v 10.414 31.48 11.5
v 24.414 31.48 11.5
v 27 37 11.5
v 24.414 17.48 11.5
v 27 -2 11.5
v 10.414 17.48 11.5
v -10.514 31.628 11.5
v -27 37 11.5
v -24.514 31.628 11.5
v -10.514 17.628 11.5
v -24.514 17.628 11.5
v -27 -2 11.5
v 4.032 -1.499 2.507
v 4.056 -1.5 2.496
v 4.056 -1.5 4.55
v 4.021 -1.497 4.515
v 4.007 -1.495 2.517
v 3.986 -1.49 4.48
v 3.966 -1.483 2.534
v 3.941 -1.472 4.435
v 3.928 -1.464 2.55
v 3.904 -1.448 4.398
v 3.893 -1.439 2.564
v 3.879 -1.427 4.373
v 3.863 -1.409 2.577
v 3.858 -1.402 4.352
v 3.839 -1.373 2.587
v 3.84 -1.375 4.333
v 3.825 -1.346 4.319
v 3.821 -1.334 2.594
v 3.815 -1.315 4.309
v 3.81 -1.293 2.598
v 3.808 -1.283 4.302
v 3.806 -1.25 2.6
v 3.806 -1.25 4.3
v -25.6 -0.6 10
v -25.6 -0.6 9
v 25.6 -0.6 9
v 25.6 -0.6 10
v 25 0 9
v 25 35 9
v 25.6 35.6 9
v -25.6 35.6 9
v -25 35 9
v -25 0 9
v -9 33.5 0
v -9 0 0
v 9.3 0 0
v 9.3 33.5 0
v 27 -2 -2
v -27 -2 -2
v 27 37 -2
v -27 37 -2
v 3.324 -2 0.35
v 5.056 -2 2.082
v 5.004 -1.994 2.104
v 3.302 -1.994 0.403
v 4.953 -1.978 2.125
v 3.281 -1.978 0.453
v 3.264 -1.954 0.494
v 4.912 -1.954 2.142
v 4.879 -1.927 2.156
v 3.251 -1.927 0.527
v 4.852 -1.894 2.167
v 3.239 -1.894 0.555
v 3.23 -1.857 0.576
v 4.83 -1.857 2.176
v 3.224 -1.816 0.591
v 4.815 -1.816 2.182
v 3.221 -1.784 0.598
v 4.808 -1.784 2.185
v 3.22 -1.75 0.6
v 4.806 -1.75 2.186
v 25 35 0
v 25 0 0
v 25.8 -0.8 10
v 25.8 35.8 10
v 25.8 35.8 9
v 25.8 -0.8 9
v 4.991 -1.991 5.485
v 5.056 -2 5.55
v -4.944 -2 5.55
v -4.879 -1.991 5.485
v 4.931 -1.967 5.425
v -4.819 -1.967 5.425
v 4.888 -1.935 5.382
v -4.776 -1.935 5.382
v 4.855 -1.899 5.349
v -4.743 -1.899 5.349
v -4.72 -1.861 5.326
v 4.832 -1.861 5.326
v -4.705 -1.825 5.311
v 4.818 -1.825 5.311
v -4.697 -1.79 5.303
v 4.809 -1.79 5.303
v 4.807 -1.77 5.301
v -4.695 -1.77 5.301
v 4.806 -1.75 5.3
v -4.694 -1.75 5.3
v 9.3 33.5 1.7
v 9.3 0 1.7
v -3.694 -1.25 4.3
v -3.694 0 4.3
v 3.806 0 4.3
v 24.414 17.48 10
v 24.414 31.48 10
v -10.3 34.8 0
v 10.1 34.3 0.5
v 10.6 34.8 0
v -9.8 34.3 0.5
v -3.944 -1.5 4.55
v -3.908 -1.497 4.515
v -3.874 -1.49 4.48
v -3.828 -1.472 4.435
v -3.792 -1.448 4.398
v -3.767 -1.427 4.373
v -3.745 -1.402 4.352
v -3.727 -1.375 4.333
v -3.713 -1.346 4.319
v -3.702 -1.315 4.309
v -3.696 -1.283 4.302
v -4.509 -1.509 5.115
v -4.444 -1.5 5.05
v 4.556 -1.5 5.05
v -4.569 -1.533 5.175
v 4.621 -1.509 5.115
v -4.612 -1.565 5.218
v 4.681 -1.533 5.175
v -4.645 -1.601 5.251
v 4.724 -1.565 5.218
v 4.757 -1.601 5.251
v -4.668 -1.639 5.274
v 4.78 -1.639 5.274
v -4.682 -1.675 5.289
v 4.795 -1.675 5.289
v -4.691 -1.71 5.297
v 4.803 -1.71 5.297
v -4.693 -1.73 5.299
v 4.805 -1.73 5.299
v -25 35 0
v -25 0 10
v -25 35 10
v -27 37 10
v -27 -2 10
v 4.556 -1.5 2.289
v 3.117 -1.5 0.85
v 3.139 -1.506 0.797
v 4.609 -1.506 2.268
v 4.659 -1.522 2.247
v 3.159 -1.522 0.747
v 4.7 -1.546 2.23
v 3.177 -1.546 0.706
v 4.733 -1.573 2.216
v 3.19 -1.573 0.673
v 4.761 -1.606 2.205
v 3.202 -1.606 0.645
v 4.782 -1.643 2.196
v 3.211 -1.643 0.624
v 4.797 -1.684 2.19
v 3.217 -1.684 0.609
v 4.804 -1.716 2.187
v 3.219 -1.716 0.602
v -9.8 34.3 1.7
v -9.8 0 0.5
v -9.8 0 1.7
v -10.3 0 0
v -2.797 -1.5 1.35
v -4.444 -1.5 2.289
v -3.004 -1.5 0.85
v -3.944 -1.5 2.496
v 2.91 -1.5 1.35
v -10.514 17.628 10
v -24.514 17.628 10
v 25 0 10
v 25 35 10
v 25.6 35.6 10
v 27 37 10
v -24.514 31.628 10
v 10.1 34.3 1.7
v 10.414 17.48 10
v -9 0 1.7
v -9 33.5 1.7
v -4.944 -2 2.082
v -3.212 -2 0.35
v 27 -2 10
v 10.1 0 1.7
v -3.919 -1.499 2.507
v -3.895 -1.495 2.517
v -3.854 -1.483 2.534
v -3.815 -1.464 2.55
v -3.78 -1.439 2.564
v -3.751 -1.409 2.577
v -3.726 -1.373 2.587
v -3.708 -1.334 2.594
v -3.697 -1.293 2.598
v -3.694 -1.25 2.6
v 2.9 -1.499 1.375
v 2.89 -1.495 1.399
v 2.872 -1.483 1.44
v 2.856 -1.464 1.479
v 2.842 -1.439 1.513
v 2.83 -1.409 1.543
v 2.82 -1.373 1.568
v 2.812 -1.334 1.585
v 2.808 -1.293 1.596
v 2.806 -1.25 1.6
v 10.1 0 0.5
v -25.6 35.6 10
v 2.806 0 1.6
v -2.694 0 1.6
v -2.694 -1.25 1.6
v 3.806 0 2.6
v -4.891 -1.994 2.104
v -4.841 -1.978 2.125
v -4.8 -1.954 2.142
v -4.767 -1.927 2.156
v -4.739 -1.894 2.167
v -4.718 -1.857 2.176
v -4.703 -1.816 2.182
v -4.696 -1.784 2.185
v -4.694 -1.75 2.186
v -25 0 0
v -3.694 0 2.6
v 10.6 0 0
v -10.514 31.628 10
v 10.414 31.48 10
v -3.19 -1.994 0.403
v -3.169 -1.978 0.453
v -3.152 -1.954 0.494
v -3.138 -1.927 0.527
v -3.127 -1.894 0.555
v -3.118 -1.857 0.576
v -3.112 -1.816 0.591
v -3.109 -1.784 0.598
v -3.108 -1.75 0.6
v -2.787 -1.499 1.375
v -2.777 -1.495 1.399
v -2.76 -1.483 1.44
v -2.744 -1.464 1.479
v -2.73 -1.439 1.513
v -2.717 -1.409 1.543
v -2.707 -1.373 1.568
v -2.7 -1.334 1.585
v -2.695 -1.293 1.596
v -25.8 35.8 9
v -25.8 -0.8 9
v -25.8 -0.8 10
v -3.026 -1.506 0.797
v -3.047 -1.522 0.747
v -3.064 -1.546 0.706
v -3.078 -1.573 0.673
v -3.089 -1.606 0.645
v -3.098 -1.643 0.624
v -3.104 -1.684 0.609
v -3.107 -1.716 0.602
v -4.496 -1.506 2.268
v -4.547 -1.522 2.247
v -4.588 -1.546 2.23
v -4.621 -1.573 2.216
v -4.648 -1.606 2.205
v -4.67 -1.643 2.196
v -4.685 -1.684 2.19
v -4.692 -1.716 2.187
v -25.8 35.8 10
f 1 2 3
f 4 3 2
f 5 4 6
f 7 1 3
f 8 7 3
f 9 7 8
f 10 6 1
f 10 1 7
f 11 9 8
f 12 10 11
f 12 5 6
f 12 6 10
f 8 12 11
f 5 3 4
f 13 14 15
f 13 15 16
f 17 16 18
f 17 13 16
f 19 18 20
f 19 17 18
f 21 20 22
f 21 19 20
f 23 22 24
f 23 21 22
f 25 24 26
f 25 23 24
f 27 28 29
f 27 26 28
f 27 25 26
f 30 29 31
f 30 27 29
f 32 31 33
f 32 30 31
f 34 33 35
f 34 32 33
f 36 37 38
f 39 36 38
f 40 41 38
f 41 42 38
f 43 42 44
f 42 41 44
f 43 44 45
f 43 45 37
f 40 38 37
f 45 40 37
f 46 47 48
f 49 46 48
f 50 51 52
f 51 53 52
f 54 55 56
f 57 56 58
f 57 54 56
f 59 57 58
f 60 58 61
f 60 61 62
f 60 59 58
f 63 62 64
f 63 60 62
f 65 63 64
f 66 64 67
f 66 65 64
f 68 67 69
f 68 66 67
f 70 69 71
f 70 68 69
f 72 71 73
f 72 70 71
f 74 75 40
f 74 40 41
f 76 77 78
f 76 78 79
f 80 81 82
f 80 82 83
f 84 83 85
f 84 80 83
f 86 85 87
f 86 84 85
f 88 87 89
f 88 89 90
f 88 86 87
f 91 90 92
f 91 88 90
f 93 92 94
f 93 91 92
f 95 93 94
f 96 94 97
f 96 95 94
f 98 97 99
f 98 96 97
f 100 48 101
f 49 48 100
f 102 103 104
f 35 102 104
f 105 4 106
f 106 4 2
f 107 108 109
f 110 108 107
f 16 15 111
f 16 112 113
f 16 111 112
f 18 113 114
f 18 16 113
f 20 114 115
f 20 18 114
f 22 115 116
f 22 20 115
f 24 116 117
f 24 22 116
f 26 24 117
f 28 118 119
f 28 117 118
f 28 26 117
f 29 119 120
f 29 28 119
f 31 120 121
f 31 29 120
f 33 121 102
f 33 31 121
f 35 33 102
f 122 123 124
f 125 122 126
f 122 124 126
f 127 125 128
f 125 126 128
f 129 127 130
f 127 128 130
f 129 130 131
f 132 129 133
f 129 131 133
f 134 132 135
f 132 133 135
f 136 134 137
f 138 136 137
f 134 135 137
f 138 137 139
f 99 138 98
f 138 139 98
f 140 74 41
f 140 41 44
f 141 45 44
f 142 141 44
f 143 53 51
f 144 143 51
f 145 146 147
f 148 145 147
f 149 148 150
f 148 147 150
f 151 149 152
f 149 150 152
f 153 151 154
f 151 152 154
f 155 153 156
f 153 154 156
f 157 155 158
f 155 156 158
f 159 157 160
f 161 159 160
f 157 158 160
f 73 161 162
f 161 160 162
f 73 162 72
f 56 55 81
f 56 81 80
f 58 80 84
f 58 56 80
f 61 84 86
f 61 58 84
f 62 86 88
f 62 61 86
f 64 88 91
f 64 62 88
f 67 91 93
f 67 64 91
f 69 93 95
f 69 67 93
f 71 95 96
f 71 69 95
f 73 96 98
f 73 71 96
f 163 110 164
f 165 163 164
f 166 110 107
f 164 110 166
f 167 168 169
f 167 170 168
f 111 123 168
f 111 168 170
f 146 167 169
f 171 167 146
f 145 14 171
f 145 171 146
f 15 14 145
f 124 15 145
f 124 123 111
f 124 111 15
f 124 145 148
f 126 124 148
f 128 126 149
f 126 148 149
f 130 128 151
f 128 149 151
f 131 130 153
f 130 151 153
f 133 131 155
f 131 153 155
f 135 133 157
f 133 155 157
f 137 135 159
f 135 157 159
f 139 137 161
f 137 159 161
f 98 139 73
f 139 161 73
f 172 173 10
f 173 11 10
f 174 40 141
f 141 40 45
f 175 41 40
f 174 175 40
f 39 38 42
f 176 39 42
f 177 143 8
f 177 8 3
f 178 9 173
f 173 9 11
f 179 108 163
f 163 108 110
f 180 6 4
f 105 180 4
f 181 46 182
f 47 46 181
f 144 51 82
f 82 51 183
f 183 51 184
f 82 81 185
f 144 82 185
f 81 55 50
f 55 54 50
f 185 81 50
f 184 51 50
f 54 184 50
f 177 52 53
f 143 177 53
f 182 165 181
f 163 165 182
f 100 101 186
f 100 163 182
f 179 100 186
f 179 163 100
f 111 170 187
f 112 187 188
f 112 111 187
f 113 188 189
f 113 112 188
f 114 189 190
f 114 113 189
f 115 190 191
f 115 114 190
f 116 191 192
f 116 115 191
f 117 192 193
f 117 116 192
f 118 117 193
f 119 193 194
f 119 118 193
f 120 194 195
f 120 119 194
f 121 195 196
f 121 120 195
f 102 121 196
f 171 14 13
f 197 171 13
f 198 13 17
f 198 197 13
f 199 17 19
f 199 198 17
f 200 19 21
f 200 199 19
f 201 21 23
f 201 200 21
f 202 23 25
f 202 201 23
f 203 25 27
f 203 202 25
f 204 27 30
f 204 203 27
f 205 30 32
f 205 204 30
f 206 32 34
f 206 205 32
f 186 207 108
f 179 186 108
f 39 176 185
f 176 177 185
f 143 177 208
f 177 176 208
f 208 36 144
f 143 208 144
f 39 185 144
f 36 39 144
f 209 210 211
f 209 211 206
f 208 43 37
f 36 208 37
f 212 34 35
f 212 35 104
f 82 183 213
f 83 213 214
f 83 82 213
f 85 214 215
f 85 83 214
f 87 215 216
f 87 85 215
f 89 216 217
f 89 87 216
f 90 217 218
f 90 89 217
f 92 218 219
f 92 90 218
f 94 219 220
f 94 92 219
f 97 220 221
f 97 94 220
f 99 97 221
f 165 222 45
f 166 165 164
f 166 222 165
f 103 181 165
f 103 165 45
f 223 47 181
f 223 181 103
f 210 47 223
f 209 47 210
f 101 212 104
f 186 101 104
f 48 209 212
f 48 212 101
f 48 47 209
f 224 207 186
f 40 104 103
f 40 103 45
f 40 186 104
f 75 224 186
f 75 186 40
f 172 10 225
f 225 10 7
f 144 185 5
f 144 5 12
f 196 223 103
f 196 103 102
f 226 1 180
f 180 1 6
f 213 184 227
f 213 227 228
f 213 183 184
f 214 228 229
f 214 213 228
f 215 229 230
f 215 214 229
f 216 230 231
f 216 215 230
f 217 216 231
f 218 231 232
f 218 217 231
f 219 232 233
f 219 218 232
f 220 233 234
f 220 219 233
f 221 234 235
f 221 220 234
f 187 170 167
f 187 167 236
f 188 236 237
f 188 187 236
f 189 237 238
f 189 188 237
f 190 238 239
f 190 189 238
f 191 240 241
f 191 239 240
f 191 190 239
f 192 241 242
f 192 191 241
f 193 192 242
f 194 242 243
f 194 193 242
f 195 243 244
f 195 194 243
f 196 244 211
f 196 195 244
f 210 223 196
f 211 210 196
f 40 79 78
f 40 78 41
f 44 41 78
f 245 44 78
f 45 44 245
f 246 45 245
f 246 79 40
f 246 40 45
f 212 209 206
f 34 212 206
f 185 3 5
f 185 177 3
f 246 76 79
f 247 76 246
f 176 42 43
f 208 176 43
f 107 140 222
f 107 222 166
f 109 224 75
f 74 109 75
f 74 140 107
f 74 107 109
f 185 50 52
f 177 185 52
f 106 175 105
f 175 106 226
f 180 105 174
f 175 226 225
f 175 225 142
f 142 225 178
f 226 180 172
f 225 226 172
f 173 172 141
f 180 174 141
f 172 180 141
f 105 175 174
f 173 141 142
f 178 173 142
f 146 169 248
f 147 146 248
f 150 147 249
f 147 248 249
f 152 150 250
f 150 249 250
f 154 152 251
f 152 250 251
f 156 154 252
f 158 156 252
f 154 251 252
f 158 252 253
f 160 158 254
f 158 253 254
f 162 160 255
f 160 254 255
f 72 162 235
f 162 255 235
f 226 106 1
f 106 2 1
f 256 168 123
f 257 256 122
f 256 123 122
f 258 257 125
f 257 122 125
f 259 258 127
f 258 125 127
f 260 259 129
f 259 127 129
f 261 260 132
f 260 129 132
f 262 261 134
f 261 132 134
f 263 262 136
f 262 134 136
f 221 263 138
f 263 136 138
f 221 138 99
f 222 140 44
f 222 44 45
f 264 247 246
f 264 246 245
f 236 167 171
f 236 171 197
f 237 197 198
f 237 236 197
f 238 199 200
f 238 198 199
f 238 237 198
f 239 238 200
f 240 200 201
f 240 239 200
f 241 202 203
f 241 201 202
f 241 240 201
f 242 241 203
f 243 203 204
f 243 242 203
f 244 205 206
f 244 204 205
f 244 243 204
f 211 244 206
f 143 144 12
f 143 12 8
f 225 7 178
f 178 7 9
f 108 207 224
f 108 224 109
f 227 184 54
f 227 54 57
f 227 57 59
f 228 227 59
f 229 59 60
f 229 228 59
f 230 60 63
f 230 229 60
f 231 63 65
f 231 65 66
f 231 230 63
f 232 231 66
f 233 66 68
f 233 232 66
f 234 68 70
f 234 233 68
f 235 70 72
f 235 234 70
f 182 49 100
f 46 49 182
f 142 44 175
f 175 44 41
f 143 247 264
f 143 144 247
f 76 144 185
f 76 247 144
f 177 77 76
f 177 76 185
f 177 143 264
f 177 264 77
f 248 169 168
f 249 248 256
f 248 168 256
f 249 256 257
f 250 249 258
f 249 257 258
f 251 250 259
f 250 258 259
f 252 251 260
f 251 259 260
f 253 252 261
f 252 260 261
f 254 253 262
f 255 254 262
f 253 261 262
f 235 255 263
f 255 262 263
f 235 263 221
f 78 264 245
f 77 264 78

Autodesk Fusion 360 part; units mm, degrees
sketch "Sketch1" plane through (0, 0, 0) normal (0, 0, 1) x (1, 0, 0)
  line L0 (-25, 0) -> (25, 0)
  line L1 (25, 0) -> (25, 35)
  line L2 (25, 35) -> (-25, 35)
  line L3 (-25, 35) -> (-25, 0)
  line L4 (27, -2) -> (27, 37)
  line L5 (27, 37) -> (-27, 37)
  line L6 (-27, 37) -> (-27, -2)
  line L7 (-27, -2) -> (27, -2)
  line L8 (0, 0) -> (0, -1.5)
  line L9 (-9, 0) -> (9.3, 0)
  line L10 (9.3, 0) -> (9.3, 33.5)
  line L11 (9.3, 33.5) -> (-9, 33.5)
  line L12 (-9, 33.5) -> (-9, 0)
  line L13 (-3.6938, -1.5) -> (3.8062, -1.5)
  line L14 (3.8062, -1.5) -> (3.8062, 0)
  line L15 (3.8062, 0) -> (-3.6938, 0)
  line L16 (-3.6938, 0) -> (-3.6938, -1.5)
  line L17 (10.1, 0) -> (10.1, 34.3)
  line L18 (10.1, 34.3) -> (-9.8, 34.3)
  line L19 (-9.8, 34.3) -> (-9.8, 0)
  dimension "d1" = 50
  dimension "d2" = 35
  dimension "d5" = 2
  dimension "d11" = 1.5
  dimension "d12" = 18.3
  dimension "d13" = 33.5
  dimension "d14" = 7.5
  dimension "d15" = 0.8
extrude "Extrude3" add sketch "Sketch1" along normal blind 1.7 contours L0 L10 L11 L12 L17 L18 L19 makes body 1
extrude "Extrude1" add sketch "Sketch1" against normal blind 2 separate body contours L0 L1 L2 L3 L17 L18 L19 | L0 L10 L11 L12 L17 L18 L19 | L0 L9 L10 L11 L12 L15 | L0 L8 L9 L13 L15 L16 | L0 L8 L9 L13 L14 L15 | L4 L5 L6 L7 makes body 2
extrude "Extrude2" add sketch "Sketch1" along normal blind 10 contours L0 L8 L9 L13 L15 L16 | L0 L8 L9 L13 L14 L15 | L4 L5 L6 L7 bodies 2
ref_plane "WorkPlane1" through (1.9031, -0.75, 1.7) normal (0, 0, 1) x (1, 0, 0)
sketch "Sketch2" plane through (1.9031, -0.75, 1.7) normal (0, 0, 1) x (1, 0, 0)
  line L0 (1.9031, -0.75) -> (1.9031, 0.75)
  line L1 (-5.5969, -0.75) -> (1.9031, -0.75)
  line L2 (-5.5969, 0.75) -> (-5.5969, -0.75)
  line L3 (1.9031, 0.75) -> (-5.5969, 0.75)
  line L4 (-5.5969, 0.75) -> (1.9031, 0.75)
  line L5 (1.9031, 0.75) -> (1.9031, -1.7033)
  line L6 (1.9031, -1.7033) -> (-5.5969, -1.7033)
  line L7 (-5.5969, -1.7033) -> (-5.5969, 0.75)
extrude "Extrude4" cut sketch "Sketch2" along normal blind 2.6 and the other way blind 0.1 bodies 2
chamfer "Chamfer1" distance 1 angle 45 2 edges at (-3.6938, -1, 1.6) (3.8062, -1, 1.6) on bodies 2
sketch "Sketch3" plane through (0, -2, 0) normal (0, -1, 0) x (1, 0, 0)
  line L0 (2.8062, 1.6) -> (-2.6938, 1.6)
  line L1 (-2.6938, 1.6) -> (-3.6938, 2.6)
  line L2 (-3.6938, 2.6) -> (-3.6938, 4.3)
  line L3 (-3.6938, 4.3) -> (3.8062, 4.3)
  line L4 (3.8062, 4.3) -> (3.8062, 2.6)
  line L5 (3.8062, 2.6) -> (2.8062, 1.6)
  line L6 (-27, 10) -> (-27, -2)
  line L7 (-27, -2) -> (27, -2)
  line L8 (27, -2) -> (27, 10)
  line L9 (27, 10) -> (-27, 10)
  line L10 (-3.6938, 4.3) -> (3.8062, 4.3)
  line L11 (3.8062, 4.3) -> (3.8062, 2.6)
  line L12 (2.8062, 1.6) -> (3.8062, 2.6)
  line L13 (2.8062, 1.6) -> (-2.6938, 1.6)
  line L14 (-3.6938, 2.6) -> (-2.6938, 1.6)
  line L15 (-3.6938, 2.6) -> (-3.6938, 4.3)
  line L16 (4.8062, 2.1858) -> (3.2204, 0.6)
  line L17 (3.2204, 0.6) -> (-3.108, 0.6)
  line L18 (-3.108, 0.6) -> (-4.6938, 2.1858)
  line L19 (-4.6938, 2.1858) -> (-4.6938, 5.3)
  line L20 (-4.6938, 5.3) -> (4.8062, 5.3)
  line L21 (4.8062, 5.3) -> (4.8062, 2.1858)
  dimension "d24" = -1
extrude "Extrude6" cut sketch "Sketch3" against normal blind 0.5 contours L16 L17 L18 L19 L20 L21 bodies 2
fillet "Fillet1" radius 0.25 18 edges at (0.0562, -1.5, 5.3) (0.0562, -2, 5.3) (-4.6938, -1.5, 3.7429) (-4.6938, -2, 3.7429) (-3.9009, -2, 1.3929) (-3.9009, -1.5, 1.3929) (0.0562, -1.5, 0.6) (0.0562, -2, 0.6) (4.8062, -1.5, 3.7429) (4.8062, -2, 3.7429) (4.0133, -1.5, 1.3929) (4.0133, -2, 1.3929) (0.0562, -1.5, 4.3) (-3.6938, -1.5, 3.45) (-3.1938, -1.5, 2.1) (0.0562, -1.5, 1.6) (3.3062, -1.5, 2.1) (3.8062, -1.5, 3.45) on bodies 2
combine "Combine1" operation add target body 1 tool bodies 2
chamfer "Chamfer2" distance 0.5 angle 45 3 edges at (10.1, 17.15, 0) (-9.8, 17.15, 0) (0.15, 34.3, 0) on bodies 1
sketch "Sketch4" plane through (0, 0, 10) normal (0, 0, 1) x (-1, 0, 0)
  line L0 (25, 0) -> (25, -35)
  line L1 (25, -35) -> (-25, -35)
  line L2 (-25, -35) -> (-25, 0)
  line L3 (-25, 0) -> (25, 0)
  line L4 (27, 2) -> (-27, 2)
  line L5 (-27, 2) -> (-27, -37)
  line L6 (-27, -37) -> (27, -37)
  line L7 (27, -37) -> (27, 2)
  line L8 (-25, -35) -> (25, -35)
  line L9 (-25, 0) -> (-25, -35)
  line L10 (25, -35) -> (25, 0)
  line L11 (25, 0) -> (-25, 0)
  line L12 (25.8, 0.8) -> (25.8, -35.8)
  line L13 (25.8, -35.8) -> (-25.8, -35.8)
  line L14 (-25.8, -35.8) -> (-25.8, 0.8)
  line L15 (-25.8, 0.8) -> (25.8, 0.8)
  dimension "d32" = -0.8
extrude "Extrude7" cut sketch "Sketch4" against normal blind 1 contours L12 L13 L14 L15 bodies 1
sketch "Sketch5" plane through (0, 0, 9) normal (0, 0, 1) x (-1, 0, 0)
  line L0 (-25, 0) -> (25, 0)
  line L1 (25, 0) -> (25, -35)
  line L2 (25, -35) -> (-25, -35)
  line L3 (-25, -35) -> (-25, 0)
  line L4 (-25.8, 0.8) -> (-25.8, -35.8)
  line L5 (-25.8, -35.8) -> (25.8, -35.8)
  line L6 (25.8, -35.8) -> (25.8, 0.8)
  line L7 (25.8, 0.8) -> (-25.8, 0.8)
  line L8 (-25.8, -35.8) -> (-25.8, 0.8)
  line L9 (25.8, -35.8) -> (-25.8, -35.8)
  line L10 (25.8, 0.8) -> (25.8, -35.8)
  line L11 (-25.8, 0.8) -> (25.8, 0.8)
  line L12 (25.6, -35.6) -> (25.6, 0.6)
  line L13 (25.6, 0.6) -> (-25.6, 0.6)
  line L14 (-25.6, 0.6) -> (-25.6, -35.6)
  line L15 (-25.6, -35.6) -> (25.6, -35.6)
  dimension "d35" = -0.2
extrude "Extrude8" add sketch "Sketch5" along normal blind 1 separate body contours L12 L13 L14 L15 makes body 3
sketch "Sketch6" plane through (0, 0, 10) normal (0, 0, 1) x (-1, 0, 0)
  line L0 (25, -35) -> (-25, -35)
  line L1 (-25, -35) -> (-25, 0)
  line L2 (-25, 0) -> (25, 0)
  line L3 (25, 0) -> (25, -35)
  line L4 (-25.6, -35.6) -> (25.6, -35.6)
  line L5 (25.6, -35.6) -> (25.6, 0.6)
  line L6 (25.6, 0.6) -> (-25.6, 0.6)
  line L7 (-25.6, 0.6) -> (-25.6, -35.6)
  line L8 (27, -37) -> (-27, -37)
  line L9 (-27, -37) -> (-27, 2)
  line L10 (-27, 2) -> (27, 2)
  line L11 (27, 2) -> (27, -37)
extrude "Extrude9" add sketch "Sketch6" along normal blind 1.5 separate body contours L0 L1 L2 L3 | L4 L5 L6 L7 | L8 L9 L10 L11 makes body 4
combine "Combine2" operation add target body 4 tool bodies 3
sketch "Sketch7" plane through (0, 0, 11.5) normal (0, 0, 1) x (-1, 0, 0)
  line L0 (27, 2) -> (-27, 2)
  line L1 (-27, 2) -> (-27, -37)
  line L2 (-27, -37) -> (27, -37)
  line L3 (27, -37) -> (27, 2)
  line L4 (24.514, -17.628) -> (10.514, -17.628)
  line L5 (10.514, -17.628) -> (10.514, -31.628)
  line L6 (10.514, -31.628) -> (24.514, -31.628)
  line L7 (24.514, -31.628) -> (24.514, -17.628)
  line L8 (-24.4142, -17.48) -> (-24.4142, -31.48)
  line L9 (-24.4142, -31.48) -> (-10.4142, -31.48)
  line L10 (-10.4142, -31.48) -> (-10.4142, -17.48)
  line L11 (-10.4142, -17.48) -> (-24.4142, -17.48)
  dimension "d40" = 14
  dimension "d41" = 14
  dimension "d42" = 14
  dimension "d43" = 14
extrude "Extrude10" cut sketch "Sketch7" against normal blind 3 contours L4 L5 L6 L7 | L8 L9 L10 L11 bodies 4
